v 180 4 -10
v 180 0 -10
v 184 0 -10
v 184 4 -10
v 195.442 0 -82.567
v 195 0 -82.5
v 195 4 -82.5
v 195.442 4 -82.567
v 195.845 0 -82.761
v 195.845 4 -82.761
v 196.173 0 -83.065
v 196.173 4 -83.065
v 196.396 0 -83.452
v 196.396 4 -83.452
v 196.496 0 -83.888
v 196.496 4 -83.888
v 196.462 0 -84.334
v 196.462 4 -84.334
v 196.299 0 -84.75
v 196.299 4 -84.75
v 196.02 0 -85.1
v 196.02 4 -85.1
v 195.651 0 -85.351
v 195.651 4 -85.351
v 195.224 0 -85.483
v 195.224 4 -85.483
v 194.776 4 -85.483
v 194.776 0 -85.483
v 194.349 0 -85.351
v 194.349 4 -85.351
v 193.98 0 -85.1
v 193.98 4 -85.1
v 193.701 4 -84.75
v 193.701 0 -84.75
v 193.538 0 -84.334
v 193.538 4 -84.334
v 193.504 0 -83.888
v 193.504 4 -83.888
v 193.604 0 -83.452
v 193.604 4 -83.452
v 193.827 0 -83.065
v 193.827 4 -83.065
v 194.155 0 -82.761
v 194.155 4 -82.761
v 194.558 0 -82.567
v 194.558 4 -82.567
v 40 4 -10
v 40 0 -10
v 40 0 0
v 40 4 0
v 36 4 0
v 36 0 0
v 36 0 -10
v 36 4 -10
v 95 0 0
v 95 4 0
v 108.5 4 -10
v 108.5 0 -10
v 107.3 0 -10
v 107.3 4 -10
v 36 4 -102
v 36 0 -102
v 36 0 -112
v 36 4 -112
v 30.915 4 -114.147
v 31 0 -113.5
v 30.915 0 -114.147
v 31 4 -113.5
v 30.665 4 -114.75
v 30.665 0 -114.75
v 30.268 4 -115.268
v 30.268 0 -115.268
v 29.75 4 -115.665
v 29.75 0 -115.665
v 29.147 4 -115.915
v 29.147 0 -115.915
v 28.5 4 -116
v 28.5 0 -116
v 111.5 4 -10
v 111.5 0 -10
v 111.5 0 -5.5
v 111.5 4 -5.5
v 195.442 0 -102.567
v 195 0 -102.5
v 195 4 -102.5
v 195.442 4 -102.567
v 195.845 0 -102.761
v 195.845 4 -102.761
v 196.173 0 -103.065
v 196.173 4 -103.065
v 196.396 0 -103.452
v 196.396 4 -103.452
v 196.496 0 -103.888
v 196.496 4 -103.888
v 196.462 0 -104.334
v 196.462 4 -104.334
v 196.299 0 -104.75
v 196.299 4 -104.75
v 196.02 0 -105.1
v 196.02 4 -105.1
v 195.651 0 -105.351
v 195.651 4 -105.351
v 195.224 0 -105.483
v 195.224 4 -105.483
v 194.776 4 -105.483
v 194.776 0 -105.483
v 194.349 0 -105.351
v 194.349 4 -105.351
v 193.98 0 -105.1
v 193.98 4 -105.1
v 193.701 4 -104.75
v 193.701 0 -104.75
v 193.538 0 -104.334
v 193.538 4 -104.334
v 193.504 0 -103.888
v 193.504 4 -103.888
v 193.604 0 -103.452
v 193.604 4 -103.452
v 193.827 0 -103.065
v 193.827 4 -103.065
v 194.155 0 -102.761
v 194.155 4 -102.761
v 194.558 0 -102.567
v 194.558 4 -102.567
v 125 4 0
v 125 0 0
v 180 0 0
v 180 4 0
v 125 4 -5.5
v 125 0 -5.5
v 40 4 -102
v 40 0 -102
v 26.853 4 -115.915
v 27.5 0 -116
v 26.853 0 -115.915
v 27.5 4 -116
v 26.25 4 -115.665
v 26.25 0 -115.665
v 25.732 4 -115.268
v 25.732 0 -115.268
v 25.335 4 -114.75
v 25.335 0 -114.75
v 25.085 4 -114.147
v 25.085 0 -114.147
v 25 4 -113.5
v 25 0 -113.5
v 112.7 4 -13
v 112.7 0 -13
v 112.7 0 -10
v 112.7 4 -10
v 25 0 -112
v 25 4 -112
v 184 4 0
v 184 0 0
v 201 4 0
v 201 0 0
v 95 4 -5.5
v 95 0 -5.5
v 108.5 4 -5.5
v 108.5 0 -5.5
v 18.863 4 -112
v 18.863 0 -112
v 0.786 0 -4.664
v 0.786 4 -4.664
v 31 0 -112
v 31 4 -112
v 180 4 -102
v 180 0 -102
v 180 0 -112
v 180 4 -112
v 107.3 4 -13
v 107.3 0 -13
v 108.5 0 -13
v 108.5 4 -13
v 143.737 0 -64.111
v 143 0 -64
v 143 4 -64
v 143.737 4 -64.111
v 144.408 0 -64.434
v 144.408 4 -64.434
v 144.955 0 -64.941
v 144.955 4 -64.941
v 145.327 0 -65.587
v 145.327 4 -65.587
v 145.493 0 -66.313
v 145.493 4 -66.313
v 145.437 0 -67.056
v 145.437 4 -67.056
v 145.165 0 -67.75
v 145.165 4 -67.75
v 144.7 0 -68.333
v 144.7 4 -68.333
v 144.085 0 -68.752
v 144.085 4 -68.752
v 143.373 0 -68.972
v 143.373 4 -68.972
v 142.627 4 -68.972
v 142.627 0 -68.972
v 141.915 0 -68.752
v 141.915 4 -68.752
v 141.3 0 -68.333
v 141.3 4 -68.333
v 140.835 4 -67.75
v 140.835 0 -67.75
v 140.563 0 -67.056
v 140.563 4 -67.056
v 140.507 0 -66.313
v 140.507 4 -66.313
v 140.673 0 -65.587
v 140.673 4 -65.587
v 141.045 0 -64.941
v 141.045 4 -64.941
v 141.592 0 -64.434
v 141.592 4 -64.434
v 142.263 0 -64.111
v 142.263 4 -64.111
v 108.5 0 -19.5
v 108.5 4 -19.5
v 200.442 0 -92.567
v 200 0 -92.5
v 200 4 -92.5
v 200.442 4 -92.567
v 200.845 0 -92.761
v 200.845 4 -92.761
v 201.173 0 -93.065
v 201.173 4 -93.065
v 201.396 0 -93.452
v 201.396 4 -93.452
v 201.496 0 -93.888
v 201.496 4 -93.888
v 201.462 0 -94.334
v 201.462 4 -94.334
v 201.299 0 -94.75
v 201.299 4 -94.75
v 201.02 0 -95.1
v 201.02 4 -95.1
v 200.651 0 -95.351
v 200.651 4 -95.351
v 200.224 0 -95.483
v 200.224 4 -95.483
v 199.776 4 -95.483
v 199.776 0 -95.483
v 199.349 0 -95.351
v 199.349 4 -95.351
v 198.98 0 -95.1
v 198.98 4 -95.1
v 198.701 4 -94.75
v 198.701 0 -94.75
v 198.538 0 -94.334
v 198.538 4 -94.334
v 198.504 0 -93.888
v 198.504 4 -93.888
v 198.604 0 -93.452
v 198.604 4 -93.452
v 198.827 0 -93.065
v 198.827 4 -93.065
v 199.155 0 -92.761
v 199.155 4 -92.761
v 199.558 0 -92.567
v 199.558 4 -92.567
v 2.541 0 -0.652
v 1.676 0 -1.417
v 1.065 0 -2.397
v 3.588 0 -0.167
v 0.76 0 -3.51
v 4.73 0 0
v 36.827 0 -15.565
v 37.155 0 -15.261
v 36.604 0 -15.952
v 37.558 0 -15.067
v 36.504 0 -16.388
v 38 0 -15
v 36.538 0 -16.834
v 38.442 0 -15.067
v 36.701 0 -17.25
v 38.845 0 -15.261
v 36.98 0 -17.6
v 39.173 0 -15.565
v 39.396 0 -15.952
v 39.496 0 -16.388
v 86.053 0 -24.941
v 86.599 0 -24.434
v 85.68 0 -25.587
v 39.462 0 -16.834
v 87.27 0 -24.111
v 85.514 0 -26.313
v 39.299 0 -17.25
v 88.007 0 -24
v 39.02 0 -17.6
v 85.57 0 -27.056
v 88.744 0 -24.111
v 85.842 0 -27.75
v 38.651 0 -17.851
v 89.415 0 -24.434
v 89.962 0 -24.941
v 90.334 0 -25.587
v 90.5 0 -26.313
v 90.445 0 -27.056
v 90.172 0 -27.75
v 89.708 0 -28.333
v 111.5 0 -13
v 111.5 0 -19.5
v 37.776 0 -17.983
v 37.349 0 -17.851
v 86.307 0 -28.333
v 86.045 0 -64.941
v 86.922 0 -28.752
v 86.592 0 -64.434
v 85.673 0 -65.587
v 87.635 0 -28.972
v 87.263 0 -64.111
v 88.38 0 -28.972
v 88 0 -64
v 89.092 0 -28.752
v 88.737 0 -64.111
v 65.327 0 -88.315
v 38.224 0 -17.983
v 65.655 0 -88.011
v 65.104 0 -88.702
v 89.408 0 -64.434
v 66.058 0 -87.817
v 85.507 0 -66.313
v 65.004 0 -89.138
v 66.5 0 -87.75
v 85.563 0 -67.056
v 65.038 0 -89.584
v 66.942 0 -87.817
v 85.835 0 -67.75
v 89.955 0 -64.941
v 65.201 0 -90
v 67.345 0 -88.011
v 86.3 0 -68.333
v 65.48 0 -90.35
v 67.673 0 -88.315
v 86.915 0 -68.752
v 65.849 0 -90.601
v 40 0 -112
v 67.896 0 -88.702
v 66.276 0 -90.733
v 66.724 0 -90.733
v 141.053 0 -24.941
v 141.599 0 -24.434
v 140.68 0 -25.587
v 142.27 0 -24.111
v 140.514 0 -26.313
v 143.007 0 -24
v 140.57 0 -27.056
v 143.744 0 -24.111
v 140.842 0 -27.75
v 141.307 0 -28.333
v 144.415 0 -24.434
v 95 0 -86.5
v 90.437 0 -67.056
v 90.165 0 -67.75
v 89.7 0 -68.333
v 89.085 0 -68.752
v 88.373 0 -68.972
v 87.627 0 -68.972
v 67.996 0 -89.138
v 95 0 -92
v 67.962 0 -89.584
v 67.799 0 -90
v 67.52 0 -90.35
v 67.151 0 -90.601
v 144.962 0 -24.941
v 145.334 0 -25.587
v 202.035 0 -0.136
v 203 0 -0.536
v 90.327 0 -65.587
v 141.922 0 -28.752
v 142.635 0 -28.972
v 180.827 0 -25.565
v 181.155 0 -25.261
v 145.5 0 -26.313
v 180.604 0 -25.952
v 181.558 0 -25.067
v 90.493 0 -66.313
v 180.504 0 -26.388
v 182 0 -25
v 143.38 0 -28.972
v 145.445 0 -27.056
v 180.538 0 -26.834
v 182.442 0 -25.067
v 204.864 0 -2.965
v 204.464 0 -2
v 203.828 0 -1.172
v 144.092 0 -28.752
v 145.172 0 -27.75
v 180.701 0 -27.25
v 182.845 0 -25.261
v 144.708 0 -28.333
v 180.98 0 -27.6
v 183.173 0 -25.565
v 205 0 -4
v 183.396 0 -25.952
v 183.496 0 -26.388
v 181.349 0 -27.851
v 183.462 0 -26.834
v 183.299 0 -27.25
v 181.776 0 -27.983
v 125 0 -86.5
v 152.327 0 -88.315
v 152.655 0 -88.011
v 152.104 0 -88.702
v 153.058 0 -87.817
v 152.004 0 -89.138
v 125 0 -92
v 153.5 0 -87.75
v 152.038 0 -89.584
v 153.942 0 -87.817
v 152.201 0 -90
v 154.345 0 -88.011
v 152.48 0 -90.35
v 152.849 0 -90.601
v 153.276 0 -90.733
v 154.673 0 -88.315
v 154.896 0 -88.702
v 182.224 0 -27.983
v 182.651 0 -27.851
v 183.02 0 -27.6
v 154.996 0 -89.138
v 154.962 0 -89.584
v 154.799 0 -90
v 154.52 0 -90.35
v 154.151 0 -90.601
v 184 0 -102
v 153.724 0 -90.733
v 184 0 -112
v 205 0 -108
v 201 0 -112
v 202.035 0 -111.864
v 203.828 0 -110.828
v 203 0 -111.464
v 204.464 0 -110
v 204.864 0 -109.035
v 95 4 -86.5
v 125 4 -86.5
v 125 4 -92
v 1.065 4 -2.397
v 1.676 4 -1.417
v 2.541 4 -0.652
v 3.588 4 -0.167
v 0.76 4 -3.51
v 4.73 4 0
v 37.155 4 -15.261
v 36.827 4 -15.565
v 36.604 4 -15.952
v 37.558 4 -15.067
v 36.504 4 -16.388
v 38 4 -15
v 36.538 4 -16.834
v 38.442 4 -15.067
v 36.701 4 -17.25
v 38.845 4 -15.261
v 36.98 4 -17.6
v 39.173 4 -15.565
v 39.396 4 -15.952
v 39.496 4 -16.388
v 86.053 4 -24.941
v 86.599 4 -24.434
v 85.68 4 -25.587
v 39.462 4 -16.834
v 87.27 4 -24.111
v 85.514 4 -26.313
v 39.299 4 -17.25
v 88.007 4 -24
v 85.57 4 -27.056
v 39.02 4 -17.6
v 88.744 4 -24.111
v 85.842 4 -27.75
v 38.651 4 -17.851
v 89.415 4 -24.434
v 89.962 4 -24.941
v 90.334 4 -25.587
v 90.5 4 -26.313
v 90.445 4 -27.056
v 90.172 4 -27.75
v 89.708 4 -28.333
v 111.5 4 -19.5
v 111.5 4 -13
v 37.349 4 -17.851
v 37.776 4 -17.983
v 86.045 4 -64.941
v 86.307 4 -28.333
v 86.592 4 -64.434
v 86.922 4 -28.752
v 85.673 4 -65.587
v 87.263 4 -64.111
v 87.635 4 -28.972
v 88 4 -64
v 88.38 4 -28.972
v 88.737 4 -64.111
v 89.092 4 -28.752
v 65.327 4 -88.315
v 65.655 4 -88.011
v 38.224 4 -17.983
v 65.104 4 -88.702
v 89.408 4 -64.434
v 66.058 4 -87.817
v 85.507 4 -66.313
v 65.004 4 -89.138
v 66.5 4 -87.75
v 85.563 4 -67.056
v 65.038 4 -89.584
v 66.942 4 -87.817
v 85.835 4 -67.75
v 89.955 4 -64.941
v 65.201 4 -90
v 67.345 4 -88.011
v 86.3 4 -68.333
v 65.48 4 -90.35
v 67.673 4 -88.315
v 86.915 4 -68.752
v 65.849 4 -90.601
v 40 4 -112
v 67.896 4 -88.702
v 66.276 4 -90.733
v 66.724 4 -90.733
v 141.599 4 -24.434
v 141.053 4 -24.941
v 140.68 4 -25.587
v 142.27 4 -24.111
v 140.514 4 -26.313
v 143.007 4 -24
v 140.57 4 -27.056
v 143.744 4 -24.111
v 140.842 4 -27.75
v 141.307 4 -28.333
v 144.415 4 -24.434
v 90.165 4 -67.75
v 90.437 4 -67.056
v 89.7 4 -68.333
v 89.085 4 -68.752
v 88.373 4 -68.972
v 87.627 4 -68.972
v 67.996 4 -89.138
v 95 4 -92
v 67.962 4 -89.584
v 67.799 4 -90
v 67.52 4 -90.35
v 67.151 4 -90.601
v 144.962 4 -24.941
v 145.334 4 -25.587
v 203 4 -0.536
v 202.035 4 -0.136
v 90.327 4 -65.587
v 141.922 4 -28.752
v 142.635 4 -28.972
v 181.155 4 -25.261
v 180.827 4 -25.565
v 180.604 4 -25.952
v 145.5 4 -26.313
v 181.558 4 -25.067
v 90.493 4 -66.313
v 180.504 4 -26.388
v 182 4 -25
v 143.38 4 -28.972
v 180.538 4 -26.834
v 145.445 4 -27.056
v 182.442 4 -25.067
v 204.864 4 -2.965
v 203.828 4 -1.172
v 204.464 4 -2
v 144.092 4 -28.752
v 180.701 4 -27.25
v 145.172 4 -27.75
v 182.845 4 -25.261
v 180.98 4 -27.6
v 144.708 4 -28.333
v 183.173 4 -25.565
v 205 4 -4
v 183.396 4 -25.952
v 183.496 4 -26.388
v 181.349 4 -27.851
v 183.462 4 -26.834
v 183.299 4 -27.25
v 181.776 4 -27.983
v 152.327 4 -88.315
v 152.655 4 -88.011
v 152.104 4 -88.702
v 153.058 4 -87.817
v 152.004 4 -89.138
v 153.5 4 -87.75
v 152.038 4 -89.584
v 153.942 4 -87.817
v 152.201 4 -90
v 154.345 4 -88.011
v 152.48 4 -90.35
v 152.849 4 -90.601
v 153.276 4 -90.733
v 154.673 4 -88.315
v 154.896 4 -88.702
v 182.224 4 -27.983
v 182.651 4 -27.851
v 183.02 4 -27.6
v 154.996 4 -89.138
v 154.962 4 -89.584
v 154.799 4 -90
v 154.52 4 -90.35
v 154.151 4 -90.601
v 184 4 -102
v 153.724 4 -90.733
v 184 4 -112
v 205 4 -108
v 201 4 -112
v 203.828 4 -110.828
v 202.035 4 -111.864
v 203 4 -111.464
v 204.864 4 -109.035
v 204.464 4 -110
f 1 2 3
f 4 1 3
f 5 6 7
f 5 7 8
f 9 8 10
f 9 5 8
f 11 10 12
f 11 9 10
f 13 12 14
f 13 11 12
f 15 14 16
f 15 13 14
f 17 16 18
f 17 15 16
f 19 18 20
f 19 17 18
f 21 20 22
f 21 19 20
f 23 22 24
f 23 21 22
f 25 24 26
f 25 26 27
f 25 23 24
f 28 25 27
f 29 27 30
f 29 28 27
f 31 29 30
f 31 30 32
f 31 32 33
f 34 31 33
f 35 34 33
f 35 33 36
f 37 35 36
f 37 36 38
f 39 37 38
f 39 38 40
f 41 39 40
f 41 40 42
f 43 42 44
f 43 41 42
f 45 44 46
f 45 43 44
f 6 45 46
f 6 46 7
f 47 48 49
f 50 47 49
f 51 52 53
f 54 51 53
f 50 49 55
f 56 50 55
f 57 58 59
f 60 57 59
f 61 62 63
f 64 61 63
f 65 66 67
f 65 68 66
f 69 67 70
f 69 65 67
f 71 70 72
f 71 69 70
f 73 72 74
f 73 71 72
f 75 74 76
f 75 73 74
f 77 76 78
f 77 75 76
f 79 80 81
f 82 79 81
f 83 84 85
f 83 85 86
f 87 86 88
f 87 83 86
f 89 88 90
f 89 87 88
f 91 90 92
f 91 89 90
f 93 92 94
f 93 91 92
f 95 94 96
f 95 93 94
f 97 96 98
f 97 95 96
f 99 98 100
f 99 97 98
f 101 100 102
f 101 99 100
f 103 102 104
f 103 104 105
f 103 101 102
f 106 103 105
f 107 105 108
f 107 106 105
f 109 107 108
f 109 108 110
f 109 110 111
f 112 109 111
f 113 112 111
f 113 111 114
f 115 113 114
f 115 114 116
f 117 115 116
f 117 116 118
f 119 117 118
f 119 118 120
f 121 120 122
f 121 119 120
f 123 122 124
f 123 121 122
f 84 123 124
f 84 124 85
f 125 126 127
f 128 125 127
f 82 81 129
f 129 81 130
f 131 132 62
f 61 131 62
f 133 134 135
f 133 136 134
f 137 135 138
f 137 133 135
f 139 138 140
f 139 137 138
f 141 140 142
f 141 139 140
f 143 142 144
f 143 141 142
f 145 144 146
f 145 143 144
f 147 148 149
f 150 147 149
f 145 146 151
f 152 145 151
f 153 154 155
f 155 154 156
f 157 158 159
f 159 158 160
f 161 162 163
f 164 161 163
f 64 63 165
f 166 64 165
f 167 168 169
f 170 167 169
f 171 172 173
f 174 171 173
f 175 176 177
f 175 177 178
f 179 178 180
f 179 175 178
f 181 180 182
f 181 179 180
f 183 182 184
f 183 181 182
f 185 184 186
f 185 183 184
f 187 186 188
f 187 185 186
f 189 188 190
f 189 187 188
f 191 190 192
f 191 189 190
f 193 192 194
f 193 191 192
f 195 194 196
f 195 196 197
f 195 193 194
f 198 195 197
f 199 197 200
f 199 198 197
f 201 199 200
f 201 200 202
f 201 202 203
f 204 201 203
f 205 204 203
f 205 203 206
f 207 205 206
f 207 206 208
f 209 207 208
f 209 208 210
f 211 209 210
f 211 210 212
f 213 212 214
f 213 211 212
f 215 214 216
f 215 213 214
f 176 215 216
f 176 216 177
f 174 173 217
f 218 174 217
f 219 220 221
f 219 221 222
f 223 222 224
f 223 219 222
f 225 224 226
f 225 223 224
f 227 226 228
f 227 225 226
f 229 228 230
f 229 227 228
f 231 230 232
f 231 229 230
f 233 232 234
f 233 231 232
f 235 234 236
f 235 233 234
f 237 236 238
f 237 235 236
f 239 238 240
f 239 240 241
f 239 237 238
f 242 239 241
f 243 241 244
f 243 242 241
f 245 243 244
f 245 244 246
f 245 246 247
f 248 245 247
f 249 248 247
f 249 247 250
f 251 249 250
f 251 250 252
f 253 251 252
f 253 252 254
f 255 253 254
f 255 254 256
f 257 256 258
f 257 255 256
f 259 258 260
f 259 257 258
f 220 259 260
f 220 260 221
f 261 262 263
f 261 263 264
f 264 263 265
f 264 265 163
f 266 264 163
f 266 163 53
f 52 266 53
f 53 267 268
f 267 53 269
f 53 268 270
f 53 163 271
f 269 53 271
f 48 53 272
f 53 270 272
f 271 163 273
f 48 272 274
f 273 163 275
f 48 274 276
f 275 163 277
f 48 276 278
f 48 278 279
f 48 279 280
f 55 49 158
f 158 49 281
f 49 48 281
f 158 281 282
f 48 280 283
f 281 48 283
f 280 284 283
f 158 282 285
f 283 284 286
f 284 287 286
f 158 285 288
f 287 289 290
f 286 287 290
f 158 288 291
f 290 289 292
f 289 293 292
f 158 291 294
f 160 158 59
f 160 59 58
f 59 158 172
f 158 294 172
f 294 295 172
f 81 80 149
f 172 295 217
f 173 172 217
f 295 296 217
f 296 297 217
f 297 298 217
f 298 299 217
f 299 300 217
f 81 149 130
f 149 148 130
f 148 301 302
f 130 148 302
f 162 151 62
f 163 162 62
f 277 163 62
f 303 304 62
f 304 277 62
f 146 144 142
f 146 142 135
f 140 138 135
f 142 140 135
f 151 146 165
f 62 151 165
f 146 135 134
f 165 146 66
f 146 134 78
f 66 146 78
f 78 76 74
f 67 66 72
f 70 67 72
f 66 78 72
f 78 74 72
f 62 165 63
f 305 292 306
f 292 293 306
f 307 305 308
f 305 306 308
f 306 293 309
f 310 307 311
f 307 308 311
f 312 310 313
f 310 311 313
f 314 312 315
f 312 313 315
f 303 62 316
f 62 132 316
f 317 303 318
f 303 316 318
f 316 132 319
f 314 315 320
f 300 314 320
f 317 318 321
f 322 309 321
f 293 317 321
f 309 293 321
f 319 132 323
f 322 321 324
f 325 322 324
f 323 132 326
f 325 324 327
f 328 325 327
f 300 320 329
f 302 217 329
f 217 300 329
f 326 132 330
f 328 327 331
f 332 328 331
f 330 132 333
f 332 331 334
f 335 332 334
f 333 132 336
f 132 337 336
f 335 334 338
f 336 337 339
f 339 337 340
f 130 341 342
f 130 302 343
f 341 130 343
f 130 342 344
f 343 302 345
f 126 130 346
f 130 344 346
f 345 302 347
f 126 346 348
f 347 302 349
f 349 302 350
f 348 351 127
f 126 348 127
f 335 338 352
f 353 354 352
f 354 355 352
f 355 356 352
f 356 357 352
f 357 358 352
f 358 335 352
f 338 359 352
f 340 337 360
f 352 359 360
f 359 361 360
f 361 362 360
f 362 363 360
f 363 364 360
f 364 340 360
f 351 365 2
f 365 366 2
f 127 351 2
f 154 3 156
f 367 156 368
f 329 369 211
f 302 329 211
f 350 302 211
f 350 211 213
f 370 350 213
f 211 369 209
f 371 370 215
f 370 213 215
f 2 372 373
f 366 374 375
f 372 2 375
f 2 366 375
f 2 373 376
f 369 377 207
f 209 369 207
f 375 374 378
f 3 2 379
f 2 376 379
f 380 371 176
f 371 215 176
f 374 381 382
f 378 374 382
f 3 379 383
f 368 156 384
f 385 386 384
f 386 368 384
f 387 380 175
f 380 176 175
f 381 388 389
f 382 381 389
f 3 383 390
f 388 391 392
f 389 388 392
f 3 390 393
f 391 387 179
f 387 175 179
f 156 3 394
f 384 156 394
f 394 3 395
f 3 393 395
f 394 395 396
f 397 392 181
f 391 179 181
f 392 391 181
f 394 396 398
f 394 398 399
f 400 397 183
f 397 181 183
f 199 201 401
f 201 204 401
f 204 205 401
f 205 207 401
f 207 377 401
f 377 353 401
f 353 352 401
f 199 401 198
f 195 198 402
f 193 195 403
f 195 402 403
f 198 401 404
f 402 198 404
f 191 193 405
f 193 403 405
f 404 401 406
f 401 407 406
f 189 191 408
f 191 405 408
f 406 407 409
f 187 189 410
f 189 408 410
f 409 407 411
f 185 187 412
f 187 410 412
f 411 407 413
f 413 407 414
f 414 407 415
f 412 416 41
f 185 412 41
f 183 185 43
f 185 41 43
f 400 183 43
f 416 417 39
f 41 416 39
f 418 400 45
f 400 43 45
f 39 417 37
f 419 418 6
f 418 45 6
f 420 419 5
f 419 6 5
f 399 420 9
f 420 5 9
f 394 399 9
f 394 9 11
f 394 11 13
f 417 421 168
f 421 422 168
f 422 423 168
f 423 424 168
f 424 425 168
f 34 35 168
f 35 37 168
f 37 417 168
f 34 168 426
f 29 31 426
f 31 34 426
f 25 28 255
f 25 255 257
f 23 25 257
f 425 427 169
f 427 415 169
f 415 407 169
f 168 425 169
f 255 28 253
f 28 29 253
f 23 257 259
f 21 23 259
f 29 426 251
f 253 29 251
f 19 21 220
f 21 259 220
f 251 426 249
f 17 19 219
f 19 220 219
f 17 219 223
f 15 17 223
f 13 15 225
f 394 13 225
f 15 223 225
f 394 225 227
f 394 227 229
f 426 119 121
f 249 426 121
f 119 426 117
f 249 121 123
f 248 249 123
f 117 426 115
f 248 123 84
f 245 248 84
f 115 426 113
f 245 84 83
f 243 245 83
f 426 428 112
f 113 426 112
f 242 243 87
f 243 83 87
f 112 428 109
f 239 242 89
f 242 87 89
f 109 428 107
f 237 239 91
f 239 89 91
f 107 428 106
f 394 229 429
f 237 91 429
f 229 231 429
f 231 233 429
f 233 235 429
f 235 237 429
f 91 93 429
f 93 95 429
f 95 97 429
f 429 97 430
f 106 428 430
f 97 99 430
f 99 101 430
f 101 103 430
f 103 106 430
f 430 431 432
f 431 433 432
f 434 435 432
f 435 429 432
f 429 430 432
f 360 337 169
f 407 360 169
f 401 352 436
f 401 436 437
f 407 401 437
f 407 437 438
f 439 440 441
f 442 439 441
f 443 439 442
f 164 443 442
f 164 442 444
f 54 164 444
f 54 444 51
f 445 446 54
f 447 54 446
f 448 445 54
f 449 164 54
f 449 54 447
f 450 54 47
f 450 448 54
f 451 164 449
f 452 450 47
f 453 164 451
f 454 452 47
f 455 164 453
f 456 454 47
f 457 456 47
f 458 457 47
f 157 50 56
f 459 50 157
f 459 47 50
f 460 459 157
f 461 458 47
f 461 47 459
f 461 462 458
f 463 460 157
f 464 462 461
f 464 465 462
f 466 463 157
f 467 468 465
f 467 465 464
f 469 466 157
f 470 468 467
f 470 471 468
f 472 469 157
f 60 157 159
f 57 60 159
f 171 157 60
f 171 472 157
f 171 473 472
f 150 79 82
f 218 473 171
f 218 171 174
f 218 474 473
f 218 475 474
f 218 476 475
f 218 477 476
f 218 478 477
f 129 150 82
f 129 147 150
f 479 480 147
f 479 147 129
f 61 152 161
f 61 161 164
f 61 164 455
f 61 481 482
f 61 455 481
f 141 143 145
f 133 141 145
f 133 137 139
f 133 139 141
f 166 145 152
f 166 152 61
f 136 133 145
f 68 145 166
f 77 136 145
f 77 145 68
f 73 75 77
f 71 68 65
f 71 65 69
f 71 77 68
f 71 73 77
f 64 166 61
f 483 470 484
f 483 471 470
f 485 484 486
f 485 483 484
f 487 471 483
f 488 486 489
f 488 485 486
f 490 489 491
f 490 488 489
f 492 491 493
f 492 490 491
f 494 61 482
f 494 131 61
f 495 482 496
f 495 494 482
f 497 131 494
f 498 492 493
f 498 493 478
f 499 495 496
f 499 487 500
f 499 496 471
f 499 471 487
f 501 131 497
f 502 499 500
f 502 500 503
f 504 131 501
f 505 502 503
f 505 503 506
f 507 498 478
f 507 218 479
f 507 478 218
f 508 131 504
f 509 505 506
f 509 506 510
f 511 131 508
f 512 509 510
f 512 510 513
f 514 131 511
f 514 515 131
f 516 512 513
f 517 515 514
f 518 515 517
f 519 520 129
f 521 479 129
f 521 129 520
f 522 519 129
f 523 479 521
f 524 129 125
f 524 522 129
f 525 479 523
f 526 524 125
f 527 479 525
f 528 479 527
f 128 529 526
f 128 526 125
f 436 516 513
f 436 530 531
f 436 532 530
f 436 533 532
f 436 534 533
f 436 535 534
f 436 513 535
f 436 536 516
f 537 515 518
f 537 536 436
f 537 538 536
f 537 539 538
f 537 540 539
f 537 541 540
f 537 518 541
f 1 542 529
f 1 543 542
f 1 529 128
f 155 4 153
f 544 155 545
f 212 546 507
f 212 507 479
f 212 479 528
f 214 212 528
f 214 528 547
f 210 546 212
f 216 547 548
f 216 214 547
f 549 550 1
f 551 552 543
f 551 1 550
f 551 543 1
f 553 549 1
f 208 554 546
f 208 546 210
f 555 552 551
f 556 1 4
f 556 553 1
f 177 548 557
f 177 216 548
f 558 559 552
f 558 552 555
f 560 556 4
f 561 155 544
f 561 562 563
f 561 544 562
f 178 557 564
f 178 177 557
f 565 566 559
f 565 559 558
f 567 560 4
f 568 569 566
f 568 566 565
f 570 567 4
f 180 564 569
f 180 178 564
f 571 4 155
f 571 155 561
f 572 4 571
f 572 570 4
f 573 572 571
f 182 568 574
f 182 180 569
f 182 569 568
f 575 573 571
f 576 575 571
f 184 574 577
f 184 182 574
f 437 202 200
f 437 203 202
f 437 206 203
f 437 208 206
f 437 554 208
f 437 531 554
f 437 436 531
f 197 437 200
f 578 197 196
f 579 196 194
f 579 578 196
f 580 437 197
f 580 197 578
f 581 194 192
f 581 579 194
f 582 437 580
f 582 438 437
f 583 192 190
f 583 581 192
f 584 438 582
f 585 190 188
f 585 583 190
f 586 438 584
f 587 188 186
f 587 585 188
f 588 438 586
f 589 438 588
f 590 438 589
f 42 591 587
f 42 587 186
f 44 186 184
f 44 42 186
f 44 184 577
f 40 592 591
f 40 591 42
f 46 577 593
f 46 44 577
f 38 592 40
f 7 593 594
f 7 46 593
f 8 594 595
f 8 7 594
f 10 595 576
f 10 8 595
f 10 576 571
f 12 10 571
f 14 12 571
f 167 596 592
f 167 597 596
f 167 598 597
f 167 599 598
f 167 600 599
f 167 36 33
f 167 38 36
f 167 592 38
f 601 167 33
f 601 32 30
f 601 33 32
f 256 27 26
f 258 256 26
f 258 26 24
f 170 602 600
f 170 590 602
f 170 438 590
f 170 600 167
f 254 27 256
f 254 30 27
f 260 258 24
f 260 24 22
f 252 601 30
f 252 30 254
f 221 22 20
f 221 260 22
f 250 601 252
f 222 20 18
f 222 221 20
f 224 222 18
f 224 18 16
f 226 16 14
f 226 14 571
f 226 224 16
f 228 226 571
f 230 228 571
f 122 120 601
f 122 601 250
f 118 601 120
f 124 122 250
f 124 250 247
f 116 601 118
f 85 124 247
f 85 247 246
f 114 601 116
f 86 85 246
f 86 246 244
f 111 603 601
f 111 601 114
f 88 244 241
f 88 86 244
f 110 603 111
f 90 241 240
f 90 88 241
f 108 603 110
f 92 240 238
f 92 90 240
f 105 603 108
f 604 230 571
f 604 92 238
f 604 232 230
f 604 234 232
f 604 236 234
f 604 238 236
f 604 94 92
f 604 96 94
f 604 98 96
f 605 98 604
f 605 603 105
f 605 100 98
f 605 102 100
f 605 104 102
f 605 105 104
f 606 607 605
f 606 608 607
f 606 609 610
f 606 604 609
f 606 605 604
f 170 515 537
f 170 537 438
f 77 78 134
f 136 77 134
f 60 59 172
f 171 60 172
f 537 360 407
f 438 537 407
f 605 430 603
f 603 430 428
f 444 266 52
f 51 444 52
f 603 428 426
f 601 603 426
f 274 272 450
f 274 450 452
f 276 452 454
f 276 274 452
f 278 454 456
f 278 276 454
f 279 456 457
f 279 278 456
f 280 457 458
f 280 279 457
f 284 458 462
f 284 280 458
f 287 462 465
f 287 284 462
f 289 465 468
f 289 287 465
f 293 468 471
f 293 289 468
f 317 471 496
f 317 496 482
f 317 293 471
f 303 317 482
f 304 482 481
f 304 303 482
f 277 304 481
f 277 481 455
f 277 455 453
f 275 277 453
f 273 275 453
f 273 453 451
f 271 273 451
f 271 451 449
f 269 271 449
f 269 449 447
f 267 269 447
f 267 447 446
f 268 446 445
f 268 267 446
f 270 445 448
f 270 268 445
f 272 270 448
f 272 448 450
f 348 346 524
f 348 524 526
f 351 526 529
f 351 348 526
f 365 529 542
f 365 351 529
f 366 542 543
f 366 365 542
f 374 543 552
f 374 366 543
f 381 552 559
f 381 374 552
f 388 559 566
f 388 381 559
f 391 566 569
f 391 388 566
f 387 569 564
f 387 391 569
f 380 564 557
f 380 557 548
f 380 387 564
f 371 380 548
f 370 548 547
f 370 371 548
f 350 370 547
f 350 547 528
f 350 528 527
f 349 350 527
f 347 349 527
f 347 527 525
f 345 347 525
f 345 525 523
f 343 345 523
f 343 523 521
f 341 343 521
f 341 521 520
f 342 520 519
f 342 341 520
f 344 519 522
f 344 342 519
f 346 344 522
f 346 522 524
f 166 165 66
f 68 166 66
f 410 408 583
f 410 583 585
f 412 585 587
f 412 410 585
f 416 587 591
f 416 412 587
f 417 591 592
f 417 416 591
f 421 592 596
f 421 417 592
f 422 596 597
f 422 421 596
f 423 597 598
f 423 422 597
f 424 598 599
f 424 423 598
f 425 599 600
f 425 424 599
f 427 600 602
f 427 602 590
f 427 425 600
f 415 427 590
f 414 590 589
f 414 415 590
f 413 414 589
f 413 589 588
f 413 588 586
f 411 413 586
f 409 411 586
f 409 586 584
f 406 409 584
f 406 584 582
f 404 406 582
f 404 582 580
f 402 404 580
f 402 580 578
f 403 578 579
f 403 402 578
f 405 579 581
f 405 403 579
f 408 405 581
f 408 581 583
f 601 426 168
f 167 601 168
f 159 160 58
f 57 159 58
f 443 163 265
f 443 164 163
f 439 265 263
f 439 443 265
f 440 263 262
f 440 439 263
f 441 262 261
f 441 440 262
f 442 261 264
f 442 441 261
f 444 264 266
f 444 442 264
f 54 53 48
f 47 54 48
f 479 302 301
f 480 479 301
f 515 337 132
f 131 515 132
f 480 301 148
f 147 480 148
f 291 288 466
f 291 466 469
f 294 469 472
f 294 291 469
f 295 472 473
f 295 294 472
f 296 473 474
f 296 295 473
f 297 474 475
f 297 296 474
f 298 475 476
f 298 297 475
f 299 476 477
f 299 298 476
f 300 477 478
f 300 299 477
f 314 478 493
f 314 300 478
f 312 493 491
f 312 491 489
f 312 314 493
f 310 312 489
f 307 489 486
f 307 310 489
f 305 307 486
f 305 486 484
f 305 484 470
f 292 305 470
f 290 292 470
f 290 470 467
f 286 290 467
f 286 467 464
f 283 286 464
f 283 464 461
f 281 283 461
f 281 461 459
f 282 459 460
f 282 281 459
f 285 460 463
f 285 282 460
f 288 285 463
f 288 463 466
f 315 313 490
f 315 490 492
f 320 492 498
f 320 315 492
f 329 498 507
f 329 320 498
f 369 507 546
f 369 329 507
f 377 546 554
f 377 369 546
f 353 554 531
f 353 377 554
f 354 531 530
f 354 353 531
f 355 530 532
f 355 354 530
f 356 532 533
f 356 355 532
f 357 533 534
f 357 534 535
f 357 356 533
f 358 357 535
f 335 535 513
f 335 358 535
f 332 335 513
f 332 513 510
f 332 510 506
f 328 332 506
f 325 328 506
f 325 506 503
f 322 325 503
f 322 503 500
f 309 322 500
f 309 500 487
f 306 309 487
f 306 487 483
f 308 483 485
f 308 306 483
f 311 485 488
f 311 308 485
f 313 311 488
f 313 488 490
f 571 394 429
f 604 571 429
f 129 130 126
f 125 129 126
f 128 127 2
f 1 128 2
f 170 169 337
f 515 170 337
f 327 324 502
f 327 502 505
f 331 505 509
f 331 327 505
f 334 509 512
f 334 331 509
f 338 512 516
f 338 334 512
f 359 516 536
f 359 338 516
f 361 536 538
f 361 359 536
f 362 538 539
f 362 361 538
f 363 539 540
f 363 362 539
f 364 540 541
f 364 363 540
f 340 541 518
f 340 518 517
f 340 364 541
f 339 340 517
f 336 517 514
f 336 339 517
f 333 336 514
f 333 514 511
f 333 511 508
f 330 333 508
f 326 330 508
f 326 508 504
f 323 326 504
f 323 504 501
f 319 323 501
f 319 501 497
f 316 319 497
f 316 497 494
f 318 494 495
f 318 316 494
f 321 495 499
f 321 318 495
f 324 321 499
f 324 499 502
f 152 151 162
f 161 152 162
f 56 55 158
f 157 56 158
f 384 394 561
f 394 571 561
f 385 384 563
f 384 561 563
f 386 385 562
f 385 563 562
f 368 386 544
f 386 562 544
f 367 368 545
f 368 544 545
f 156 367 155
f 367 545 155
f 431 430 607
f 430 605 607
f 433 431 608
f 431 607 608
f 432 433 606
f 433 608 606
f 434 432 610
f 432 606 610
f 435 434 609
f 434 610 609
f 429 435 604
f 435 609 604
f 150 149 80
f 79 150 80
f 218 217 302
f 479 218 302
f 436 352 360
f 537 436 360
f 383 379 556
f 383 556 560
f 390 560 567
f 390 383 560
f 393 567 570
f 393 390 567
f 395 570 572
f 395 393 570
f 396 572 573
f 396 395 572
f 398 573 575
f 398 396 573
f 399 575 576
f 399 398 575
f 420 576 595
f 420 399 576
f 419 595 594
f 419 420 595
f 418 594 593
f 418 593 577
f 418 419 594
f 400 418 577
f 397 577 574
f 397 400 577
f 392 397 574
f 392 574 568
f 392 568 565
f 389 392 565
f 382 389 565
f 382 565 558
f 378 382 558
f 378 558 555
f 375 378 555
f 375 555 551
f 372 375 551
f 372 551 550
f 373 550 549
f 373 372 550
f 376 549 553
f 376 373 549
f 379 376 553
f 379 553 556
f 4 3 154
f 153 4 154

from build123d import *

# Parameters (mm, degrees)
SKETCH1_R           = 1.5
SKETCH1_R_2         = 2.5
SKETCH1_W           = 30
SKETCH1_H           = 5.5
BOSS_EXTRUDE1_DEPTH = 4
FILLET1_R           = 4
FILLET3_R           = 4
FILLET4_R           = 4
FILLET5_R           = 2.5


with BuildPart() as part:
    # Sketch1 → Boss-Extrude1 (new body)
    with BuildSketch(Plane(origin=(0, 0, 0), x_dir=(1, 0, 0), z_dir=(0, 1, 0))):
        Polygon((158.5, 0), (180, 0), (180, 10), (184, 10), (184, 0), (205, 0), (205, 112), (184, 112), (184, 102), (180, 102), (180, 112), (40, 112), (40, 102), (36, 102), (36, 112), (31, 112), (31, 116), (25, 116), (25, 112), (18.8632, 112), (0, 0), (36, 0), (36, 10), (40, 10), (40, 0), (95, 0), (95, 5.5), (108.5, 5.5), (108.5, 10), (107.3, 10), (107.3, 13), (108.5, 13), (108.5, 19.5), (111.5, 19.5), (111.5, 13), (112.7, 13), (112.7, 10), (111.5, 10), (111.5, 5.5), (125, 5.5), (125, 0), (155.5, 0), align=None)
        with Locations(Location((153.5, 89.25, 0), (0, 0, 270))):
            Circle(SKETCH1_R, mode=Mode.SUBTRACT)
        with Locations(Location((66.5, 89.25, 0), (0, 0, 270))):
            Circle(SKETCH1_R, mode=Mode.SUBTRACT)
        with Locations(Location((88, 66.5, 0), (0, 0, 270))):
            Circle(SKETCH1_R_2, mode=Mode.SUBTRACT)
        with Locations(Location((88.007190659, 26.500000646, 0), (0, 0, 270))):
            Circle(SKETCH1_R_2, mode=Mode.SUBTRACT)
        with Locations(Location((143, 66.5, 0), (0, 0, 270))):
            Circle(SKETCH1_R_2, mode=Mode.SUBTRACT)
        with Locations(Location((143.007190659, 26.500000646, 0), (0, 0, 270))):
            Circle(SKETCH1_R_2, mode=Mode.SUBTRACT)
        with Locations(Location((195, 104, 0), (0, 0, 270))):
            Circle(SKETCH1_R, mode=Mode.SUBTRACT)
        with Locations(Location((195, 84, 0), (0, 0, 270))):
            Circle(SKETCH1_R, mode=Mode.SUBTRACT)
        with Locations(Location((200, 94, 0), (0, 0, 270))):
            Circle(SKETCH1_R, mode=Mode.SUBTRACT)
        with Locations(Location((182, 26.5, 0), (0, 0, 270))):
            Circle(SKETCH1_R, mode=Mode.SUBTRACT)
        with Locations(Location((38, 16.5, 0), (0, 0, 270))):
            Circle(SKETCH1_R, mode=Mode.SUBTRACT)
        with Locations((110, 89.25)):
            Rectangle(SKETCH1_W, SKETCH1_H, mode=Mode.SUBTRACT)
    extrude(amount=BOSS_EXTRUDE1_DEPTH)

    # Fillet1
    fillet1_edges = [part.edges().sort_by_distance(p)[0] for p in [
        (0, 2, 0),
    ]]
    fillet(fillet1_edges, radius=FILLET1_R)

    # Fillet3
    fillet3_edges = [part.edges().sort_by_distance(p)[0] for p in [
        (205, 2, -112),
    ]]
    fillet(fillet3_edges, radius=FILLET3_R)

    # Fillet4
    fillet4_edges = [part.edges().sort_by_distance(p)[0] for p in [
        (205, 2, 0),
    ]]
    fillet(fillet4_edges, radius=FILLET4_R)

    # Fillet5
    fillet5_edges = [part.edges().sort_by_distance(p)[0] for p in [
        (25, 2, -116),
        (31, 2, -116),
    ]]
    fillet(fillet5_edges, radius=FILLET5_R)


solid = part.part
